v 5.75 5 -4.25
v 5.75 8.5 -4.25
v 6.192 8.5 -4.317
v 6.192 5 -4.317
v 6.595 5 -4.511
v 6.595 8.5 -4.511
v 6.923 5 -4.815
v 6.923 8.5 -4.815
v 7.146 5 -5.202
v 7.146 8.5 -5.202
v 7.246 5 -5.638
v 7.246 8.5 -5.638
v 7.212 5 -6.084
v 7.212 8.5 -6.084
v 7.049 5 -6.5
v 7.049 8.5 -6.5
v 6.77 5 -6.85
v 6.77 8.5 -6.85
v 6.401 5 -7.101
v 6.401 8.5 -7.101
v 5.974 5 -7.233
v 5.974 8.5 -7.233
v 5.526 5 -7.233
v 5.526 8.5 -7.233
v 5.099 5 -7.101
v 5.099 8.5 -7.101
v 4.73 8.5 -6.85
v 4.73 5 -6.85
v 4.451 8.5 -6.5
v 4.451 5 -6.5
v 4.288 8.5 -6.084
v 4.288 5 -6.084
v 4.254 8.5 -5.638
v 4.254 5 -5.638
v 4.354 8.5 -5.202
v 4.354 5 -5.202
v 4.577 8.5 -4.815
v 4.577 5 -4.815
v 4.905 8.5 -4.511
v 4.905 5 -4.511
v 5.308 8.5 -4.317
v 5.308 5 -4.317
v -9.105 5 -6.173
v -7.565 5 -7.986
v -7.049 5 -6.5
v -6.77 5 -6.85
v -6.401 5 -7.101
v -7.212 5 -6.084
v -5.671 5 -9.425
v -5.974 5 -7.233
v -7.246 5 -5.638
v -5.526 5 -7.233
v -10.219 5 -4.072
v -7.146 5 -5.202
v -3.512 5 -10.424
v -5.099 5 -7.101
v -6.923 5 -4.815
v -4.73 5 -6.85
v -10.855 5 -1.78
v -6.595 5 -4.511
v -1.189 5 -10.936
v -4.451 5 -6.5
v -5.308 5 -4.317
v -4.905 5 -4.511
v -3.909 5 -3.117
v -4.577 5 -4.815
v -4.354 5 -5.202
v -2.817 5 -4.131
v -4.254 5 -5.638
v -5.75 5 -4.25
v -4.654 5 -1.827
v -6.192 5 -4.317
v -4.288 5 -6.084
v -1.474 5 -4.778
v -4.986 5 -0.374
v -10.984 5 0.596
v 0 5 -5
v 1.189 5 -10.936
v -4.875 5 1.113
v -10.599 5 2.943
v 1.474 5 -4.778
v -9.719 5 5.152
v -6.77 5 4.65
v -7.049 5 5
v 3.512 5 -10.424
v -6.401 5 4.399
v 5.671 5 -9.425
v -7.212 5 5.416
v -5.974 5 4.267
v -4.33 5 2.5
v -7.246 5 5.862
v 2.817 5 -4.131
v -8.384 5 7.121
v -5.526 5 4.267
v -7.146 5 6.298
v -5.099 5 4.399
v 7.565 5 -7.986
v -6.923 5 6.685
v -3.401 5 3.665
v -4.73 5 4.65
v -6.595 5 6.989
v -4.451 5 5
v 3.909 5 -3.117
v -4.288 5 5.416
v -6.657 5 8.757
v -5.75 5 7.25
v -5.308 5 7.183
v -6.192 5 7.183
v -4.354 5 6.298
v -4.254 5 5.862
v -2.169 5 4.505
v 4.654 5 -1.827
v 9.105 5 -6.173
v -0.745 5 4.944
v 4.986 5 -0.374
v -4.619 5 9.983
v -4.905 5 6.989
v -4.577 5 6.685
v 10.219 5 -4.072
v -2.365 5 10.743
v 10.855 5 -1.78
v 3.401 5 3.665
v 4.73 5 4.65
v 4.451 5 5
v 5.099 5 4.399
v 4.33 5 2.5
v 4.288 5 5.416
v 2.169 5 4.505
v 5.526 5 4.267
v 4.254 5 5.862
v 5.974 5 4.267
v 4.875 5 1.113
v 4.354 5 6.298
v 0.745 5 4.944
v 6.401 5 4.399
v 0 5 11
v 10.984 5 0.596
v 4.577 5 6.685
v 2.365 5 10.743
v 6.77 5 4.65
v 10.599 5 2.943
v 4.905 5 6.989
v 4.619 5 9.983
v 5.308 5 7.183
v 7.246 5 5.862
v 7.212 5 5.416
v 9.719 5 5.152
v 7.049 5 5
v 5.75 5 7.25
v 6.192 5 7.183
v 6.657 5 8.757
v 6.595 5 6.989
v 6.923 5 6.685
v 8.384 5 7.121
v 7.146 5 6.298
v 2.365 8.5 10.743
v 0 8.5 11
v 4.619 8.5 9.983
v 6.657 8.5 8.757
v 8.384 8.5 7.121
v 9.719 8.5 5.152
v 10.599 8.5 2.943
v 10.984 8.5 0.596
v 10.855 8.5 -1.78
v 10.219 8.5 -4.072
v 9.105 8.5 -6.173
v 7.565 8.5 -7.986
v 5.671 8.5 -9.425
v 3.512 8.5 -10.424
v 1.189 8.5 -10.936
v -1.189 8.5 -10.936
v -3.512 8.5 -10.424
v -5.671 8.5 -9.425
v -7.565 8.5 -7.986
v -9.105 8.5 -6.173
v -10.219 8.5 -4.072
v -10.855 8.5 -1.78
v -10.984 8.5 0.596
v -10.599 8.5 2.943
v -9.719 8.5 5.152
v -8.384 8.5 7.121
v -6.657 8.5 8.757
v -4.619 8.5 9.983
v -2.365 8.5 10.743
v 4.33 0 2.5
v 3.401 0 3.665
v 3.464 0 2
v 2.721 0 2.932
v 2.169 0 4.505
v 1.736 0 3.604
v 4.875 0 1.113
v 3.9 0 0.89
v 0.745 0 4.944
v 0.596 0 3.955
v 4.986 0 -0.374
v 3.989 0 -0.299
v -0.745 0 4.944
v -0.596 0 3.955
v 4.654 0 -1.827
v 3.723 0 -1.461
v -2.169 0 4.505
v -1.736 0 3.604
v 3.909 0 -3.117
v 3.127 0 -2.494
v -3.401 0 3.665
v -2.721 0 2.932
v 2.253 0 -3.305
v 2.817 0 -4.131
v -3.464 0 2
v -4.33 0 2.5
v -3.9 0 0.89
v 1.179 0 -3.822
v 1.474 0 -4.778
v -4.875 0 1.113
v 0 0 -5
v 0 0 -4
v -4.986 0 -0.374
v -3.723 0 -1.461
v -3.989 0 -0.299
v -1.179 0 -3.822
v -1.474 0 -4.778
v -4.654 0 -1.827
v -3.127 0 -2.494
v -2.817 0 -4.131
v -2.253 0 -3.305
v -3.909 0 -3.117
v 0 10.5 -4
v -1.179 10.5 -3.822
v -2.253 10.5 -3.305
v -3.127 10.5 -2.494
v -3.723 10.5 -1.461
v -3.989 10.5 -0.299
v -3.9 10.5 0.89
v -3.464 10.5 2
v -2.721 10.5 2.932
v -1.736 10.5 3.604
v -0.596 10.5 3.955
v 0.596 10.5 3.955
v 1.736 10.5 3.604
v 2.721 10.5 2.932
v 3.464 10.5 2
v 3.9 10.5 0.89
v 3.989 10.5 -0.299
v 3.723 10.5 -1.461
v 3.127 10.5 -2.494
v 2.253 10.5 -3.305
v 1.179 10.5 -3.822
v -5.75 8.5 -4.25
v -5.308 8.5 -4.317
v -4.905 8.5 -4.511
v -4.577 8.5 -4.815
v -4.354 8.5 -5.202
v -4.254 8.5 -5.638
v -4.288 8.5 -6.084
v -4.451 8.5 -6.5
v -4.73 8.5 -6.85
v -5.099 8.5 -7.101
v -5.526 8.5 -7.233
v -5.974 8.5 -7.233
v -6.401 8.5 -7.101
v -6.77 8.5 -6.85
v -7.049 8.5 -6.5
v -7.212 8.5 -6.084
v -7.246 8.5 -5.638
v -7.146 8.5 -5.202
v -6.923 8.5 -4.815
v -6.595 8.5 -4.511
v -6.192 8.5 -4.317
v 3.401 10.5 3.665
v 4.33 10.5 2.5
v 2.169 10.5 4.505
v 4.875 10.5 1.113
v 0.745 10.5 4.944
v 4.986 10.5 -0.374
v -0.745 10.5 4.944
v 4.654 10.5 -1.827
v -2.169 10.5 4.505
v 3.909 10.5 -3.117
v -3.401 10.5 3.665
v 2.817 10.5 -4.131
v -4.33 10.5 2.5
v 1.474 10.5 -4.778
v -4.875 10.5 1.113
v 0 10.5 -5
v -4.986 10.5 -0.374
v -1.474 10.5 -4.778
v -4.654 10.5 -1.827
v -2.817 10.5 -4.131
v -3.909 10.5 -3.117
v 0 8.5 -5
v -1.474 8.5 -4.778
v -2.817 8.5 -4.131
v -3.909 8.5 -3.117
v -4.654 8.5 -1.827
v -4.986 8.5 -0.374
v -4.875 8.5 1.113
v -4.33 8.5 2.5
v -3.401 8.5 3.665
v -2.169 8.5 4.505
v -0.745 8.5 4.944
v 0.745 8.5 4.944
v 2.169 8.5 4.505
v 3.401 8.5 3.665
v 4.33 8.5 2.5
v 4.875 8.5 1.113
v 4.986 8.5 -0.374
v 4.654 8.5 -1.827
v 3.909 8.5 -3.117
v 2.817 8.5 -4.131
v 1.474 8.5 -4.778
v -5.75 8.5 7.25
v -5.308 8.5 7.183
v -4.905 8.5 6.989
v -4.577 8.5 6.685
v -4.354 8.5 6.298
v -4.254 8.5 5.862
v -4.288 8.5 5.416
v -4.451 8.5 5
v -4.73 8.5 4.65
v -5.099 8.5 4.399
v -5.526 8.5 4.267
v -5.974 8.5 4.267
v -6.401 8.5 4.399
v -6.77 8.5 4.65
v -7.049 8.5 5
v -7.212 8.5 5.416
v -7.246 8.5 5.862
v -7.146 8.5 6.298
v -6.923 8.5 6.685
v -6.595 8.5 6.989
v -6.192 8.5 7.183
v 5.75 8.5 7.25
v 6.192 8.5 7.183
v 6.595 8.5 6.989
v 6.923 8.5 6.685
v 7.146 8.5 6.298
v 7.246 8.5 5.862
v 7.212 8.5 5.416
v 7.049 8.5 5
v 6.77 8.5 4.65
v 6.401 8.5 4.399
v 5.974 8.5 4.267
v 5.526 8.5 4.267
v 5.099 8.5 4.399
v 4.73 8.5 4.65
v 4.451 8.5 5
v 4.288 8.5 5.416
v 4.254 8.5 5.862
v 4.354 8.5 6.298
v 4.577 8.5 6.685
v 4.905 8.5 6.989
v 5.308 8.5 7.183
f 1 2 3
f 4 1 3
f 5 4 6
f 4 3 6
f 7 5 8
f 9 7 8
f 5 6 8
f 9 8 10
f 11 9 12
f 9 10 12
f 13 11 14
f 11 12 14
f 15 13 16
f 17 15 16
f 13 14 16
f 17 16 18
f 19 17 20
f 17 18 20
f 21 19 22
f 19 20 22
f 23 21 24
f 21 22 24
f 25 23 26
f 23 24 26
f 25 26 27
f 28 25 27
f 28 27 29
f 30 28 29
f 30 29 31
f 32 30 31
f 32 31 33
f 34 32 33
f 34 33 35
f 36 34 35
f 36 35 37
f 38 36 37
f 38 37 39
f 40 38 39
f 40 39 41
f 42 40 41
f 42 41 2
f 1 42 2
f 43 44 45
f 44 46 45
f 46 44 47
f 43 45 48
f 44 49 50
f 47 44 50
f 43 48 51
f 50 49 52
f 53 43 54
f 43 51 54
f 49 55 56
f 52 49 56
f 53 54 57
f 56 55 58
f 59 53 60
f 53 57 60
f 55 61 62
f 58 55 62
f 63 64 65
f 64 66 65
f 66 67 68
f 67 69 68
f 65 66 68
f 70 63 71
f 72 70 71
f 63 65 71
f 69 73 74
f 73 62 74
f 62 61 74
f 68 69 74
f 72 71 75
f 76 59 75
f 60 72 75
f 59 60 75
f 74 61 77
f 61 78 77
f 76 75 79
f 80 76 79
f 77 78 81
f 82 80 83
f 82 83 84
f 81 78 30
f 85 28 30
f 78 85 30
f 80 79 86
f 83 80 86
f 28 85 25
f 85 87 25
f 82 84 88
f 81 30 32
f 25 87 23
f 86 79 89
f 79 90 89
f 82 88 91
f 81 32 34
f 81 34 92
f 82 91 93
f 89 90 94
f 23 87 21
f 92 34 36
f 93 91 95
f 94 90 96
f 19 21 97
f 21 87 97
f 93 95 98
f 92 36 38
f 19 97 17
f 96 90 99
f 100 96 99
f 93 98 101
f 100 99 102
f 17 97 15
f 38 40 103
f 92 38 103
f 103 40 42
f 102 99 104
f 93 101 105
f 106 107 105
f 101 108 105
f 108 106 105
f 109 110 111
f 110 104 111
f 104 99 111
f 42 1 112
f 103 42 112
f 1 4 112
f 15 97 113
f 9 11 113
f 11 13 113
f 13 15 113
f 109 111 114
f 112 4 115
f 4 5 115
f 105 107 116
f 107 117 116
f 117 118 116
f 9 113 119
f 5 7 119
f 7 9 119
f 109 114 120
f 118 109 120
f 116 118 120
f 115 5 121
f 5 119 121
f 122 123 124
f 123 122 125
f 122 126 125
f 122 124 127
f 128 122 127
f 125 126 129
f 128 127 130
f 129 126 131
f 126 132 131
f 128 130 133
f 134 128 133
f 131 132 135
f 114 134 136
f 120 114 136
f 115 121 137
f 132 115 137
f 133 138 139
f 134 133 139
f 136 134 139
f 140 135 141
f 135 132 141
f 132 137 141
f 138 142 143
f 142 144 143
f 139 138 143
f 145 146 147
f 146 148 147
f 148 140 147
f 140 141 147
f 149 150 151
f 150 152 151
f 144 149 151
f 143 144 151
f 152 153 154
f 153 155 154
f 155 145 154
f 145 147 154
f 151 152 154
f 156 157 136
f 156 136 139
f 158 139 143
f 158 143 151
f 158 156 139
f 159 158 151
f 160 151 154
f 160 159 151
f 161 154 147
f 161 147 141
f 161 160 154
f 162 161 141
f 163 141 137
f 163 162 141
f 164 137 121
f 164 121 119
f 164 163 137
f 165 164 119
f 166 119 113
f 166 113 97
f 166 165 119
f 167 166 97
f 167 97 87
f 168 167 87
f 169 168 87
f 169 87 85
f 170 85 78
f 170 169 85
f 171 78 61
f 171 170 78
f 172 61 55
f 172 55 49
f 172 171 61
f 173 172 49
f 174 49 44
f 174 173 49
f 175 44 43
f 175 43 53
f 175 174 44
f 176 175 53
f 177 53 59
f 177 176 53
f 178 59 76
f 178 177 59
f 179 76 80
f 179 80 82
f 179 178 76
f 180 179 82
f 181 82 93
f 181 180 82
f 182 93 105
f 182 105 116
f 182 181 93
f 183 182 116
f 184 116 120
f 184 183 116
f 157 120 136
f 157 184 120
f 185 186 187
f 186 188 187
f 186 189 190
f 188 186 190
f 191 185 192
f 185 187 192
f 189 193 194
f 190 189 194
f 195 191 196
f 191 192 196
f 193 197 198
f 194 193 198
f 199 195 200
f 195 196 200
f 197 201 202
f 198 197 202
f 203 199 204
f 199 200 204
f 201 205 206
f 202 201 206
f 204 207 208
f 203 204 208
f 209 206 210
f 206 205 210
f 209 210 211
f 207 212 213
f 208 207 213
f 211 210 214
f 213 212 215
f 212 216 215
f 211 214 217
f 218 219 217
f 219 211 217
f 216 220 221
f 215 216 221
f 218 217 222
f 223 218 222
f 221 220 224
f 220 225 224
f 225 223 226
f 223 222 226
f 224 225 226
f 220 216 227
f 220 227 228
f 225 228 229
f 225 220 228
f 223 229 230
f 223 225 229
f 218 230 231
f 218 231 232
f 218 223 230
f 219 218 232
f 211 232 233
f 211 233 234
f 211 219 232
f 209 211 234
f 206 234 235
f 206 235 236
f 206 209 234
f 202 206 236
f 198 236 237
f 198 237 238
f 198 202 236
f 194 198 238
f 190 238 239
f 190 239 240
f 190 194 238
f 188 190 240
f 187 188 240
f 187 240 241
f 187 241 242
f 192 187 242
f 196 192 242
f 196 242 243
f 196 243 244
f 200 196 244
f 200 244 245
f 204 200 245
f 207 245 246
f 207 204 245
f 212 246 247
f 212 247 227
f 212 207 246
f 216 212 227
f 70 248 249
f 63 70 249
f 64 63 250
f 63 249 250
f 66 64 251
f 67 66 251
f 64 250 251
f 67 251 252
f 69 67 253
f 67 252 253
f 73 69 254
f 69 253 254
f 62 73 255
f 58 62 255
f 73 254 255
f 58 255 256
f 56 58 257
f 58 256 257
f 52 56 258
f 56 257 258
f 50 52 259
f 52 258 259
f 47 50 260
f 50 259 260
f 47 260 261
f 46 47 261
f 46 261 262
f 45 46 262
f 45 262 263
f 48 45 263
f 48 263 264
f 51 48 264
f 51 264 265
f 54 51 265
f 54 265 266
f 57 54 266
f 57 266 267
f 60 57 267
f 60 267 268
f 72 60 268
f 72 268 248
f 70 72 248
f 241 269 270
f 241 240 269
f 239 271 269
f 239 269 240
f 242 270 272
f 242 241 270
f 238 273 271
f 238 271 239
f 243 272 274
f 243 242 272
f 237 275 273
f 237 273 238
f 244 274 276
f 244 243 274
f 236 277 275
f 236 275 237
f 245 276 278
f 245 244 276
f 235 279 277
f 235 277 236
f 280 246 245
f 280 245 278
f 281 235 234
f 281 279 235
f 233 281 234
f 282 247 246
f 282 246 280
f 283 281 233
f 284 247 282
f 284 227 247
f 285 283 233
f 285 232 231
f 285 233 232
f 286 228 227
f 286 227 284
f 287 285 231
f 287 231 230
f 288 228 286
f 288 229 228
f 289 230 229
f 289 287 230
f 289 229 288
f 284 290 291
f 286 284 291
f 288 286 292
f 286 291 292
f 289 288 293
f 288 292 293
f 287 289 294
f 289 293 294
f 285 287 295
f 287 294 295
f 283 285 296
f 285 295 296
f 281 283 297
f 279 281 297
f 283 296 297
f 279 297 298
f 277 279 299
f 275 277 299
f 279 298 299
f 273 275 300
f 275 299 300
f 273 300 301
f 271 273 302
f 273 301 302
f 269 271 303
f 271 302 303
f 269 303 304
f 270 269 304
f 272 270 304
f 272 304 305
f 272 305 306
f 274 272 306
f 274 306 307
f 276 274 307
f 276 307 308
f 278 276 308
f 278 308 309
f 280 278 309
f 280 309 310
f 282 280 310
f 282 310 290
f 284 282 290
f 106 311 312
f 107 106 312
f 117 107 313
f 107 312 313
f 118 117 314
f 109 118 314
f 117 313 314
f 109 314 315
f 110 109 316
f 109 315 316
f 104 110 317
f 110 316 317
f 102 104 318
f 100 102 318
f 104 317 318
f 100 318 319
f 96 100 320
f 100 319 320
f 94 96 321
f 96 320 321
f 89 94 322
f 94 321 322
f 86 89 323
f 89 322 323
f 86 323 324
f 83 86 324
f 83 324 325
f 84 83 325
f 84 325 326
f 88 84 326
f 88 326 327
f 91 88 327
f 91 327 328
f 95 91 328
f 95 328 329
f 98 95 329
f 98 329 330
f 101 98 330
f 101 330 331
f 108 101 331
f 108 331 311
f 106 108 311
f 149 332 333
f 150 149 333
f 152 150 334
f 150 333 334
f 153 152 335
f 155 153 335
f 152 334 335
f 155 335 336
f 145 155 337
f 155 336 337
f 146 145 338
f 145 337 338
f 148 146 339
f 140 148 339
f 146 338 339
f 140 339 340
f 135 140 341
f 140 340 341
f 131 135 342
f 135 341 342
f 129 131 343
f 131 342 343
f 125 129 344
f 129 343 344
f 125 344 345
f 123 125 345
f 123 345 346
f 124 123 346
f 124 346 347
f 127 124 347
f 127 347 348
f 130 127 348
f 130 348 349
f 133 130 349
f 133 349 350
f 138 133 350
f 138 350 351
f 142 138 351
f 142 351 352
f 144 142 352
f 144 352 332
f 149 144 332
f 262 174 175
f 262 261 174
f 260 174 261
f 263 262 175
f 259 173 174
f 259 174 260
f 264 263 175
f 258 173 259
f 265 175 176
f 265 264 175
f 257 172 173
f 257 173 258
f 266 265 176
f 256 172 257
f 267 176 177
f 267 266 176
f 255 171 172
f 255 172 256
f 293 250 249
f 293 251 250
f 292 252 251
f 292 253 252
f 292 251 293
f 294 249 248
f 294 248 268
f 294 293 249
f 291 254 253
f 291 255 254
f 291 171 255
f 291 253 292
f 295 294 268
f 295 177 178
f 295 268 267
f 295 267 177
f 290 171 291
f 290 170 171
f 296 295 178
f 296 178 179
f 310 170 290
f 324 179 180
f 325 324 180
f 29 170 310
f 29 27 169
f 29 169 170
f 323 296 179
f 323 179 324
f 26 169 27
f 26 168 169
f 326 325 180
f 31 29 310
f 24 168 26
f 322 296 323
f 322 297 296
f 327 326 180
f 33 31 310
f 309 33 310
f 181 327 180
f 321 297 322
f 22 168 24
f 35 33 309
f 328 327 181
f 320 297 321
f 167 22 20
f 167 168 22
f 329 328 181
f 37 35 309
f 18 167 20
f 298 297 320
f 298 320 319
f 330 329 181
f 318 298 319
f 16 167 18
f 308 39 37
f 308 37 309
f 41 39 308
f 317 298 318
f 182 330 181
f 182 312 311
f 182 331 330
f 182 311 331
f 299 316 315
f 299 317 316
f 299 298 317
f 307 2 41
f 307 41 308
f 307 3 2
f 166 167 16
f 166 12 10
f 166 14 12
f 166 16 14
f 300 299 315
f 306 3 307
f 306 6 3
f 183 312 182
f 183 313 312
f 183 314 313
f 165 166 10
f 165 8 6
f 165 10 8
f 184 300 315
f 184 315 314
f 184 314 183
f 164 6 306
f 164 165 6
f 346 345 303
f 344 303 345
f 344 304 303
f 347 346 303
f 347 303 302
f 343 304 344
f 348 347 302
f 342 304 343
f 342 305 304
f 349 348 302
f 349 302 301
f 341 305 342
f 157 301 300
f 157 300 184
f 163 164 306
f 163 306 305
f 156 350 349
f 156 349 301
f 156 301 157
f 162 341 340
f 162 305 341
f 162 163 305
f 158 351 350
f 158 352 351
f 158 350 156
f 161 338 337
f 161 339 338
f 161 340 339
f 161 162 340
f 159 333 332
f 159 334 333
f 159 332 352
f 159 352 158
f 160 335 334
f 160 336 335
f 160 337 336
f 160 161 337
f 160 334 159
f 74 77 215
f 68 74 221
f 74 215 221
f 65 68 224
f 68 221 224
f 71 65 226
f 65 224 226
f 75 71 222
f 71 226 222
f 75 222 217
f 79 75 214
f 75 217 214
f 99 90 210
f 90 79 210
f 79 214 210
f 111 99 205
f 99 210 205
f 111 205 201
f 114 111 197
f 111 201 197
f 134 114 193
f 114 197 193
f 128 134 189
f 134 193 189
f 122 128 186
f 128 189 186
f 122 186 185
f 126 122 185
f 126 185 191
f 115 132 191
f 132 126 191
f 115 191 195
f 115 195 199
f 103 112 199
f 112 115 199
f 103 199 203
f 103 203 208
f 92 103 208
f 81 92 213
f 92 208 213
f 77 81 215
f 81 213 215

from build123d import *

# Parameters (mm, degrees)
SKETCH1_R           = 5
SKETCH1_R_2         = 4
BOSS_EXTRUDE1_DEPTH = 10.5
BOSS_EXTRUDE2_START = -2
SKETCH2_R           = 11
SKETCH2_R_2         = 4.5
BOSS_EXTRUDE2_DEPTH = 3.5
SKETCH3_R           = 1.5
CUT_EXTRUDE1_DEPTH  = 18.727097901


with BuildPart() as part:
    # Sketch1 → Boss-Extrude1 (new body)
    with BuildSketch(Plane(origin=(0, 0, 0), x_dir=(1, 0, 0), z_dir=(0, 1, 0))):
        with Locations(Location((0, 0, 0), (0, 0, 90))):
            Circle(SKETCH1_R)
        with Locations(Location((0, 0, 0), (0, 0, 90))):
            Circle(SKETCH1_R_2, mode=Mode.SUBTRACT)
    extrude(amount=BOSS_EXTRUDE1_DEPTH)

    # Sketch2 → Boss-Extrude2 (add)
    with BuildSketch(Plane(origin=(0, 10.5, 0), x_dir=(1, 0, 0), z_dir=(0, 1, 0)).offset(BOSS_EXTRUDE2_START)):
        with Locations(Location((0, 0, 0), (0, 0, 270))):
            Circle(SKETCH2_R)
        Circle(SKETCH2_R_2, mode=Mode.SUBTRACT)
    extrude(amount=-BOSS_EXTRUDE2_DEPTH)

    # Sketch3 → Cut-Extrude1 (cut, through all)
    with BuildSketch(Plane(origin=(0, 8.5, 0), x_dir=(1, 0, 0), z_dir=(0, 1, 0))):
        with Locations(Location((-5.75, 5.75, 0), (0, 0, 270))):
            Circle(SKETCH3_R)
        with Locations(Location((5.75, 5.75, 0), (0, 0, 270))):
            Circle(SKETCH3_R)
        with Locations(Location((5.75, -5.75, 0), (0, 0, 270))):
            Circle(SKETCH3_R)
        with Locations(Location((-5.75, -5.75, 0), (0, 0, 270))):
            Circle(SKETCH3_R)
    extrude(amount=-CUT_EXTRUDE1_DEPTH, mode=Mode.SUBTRACT)


solid = part.part
